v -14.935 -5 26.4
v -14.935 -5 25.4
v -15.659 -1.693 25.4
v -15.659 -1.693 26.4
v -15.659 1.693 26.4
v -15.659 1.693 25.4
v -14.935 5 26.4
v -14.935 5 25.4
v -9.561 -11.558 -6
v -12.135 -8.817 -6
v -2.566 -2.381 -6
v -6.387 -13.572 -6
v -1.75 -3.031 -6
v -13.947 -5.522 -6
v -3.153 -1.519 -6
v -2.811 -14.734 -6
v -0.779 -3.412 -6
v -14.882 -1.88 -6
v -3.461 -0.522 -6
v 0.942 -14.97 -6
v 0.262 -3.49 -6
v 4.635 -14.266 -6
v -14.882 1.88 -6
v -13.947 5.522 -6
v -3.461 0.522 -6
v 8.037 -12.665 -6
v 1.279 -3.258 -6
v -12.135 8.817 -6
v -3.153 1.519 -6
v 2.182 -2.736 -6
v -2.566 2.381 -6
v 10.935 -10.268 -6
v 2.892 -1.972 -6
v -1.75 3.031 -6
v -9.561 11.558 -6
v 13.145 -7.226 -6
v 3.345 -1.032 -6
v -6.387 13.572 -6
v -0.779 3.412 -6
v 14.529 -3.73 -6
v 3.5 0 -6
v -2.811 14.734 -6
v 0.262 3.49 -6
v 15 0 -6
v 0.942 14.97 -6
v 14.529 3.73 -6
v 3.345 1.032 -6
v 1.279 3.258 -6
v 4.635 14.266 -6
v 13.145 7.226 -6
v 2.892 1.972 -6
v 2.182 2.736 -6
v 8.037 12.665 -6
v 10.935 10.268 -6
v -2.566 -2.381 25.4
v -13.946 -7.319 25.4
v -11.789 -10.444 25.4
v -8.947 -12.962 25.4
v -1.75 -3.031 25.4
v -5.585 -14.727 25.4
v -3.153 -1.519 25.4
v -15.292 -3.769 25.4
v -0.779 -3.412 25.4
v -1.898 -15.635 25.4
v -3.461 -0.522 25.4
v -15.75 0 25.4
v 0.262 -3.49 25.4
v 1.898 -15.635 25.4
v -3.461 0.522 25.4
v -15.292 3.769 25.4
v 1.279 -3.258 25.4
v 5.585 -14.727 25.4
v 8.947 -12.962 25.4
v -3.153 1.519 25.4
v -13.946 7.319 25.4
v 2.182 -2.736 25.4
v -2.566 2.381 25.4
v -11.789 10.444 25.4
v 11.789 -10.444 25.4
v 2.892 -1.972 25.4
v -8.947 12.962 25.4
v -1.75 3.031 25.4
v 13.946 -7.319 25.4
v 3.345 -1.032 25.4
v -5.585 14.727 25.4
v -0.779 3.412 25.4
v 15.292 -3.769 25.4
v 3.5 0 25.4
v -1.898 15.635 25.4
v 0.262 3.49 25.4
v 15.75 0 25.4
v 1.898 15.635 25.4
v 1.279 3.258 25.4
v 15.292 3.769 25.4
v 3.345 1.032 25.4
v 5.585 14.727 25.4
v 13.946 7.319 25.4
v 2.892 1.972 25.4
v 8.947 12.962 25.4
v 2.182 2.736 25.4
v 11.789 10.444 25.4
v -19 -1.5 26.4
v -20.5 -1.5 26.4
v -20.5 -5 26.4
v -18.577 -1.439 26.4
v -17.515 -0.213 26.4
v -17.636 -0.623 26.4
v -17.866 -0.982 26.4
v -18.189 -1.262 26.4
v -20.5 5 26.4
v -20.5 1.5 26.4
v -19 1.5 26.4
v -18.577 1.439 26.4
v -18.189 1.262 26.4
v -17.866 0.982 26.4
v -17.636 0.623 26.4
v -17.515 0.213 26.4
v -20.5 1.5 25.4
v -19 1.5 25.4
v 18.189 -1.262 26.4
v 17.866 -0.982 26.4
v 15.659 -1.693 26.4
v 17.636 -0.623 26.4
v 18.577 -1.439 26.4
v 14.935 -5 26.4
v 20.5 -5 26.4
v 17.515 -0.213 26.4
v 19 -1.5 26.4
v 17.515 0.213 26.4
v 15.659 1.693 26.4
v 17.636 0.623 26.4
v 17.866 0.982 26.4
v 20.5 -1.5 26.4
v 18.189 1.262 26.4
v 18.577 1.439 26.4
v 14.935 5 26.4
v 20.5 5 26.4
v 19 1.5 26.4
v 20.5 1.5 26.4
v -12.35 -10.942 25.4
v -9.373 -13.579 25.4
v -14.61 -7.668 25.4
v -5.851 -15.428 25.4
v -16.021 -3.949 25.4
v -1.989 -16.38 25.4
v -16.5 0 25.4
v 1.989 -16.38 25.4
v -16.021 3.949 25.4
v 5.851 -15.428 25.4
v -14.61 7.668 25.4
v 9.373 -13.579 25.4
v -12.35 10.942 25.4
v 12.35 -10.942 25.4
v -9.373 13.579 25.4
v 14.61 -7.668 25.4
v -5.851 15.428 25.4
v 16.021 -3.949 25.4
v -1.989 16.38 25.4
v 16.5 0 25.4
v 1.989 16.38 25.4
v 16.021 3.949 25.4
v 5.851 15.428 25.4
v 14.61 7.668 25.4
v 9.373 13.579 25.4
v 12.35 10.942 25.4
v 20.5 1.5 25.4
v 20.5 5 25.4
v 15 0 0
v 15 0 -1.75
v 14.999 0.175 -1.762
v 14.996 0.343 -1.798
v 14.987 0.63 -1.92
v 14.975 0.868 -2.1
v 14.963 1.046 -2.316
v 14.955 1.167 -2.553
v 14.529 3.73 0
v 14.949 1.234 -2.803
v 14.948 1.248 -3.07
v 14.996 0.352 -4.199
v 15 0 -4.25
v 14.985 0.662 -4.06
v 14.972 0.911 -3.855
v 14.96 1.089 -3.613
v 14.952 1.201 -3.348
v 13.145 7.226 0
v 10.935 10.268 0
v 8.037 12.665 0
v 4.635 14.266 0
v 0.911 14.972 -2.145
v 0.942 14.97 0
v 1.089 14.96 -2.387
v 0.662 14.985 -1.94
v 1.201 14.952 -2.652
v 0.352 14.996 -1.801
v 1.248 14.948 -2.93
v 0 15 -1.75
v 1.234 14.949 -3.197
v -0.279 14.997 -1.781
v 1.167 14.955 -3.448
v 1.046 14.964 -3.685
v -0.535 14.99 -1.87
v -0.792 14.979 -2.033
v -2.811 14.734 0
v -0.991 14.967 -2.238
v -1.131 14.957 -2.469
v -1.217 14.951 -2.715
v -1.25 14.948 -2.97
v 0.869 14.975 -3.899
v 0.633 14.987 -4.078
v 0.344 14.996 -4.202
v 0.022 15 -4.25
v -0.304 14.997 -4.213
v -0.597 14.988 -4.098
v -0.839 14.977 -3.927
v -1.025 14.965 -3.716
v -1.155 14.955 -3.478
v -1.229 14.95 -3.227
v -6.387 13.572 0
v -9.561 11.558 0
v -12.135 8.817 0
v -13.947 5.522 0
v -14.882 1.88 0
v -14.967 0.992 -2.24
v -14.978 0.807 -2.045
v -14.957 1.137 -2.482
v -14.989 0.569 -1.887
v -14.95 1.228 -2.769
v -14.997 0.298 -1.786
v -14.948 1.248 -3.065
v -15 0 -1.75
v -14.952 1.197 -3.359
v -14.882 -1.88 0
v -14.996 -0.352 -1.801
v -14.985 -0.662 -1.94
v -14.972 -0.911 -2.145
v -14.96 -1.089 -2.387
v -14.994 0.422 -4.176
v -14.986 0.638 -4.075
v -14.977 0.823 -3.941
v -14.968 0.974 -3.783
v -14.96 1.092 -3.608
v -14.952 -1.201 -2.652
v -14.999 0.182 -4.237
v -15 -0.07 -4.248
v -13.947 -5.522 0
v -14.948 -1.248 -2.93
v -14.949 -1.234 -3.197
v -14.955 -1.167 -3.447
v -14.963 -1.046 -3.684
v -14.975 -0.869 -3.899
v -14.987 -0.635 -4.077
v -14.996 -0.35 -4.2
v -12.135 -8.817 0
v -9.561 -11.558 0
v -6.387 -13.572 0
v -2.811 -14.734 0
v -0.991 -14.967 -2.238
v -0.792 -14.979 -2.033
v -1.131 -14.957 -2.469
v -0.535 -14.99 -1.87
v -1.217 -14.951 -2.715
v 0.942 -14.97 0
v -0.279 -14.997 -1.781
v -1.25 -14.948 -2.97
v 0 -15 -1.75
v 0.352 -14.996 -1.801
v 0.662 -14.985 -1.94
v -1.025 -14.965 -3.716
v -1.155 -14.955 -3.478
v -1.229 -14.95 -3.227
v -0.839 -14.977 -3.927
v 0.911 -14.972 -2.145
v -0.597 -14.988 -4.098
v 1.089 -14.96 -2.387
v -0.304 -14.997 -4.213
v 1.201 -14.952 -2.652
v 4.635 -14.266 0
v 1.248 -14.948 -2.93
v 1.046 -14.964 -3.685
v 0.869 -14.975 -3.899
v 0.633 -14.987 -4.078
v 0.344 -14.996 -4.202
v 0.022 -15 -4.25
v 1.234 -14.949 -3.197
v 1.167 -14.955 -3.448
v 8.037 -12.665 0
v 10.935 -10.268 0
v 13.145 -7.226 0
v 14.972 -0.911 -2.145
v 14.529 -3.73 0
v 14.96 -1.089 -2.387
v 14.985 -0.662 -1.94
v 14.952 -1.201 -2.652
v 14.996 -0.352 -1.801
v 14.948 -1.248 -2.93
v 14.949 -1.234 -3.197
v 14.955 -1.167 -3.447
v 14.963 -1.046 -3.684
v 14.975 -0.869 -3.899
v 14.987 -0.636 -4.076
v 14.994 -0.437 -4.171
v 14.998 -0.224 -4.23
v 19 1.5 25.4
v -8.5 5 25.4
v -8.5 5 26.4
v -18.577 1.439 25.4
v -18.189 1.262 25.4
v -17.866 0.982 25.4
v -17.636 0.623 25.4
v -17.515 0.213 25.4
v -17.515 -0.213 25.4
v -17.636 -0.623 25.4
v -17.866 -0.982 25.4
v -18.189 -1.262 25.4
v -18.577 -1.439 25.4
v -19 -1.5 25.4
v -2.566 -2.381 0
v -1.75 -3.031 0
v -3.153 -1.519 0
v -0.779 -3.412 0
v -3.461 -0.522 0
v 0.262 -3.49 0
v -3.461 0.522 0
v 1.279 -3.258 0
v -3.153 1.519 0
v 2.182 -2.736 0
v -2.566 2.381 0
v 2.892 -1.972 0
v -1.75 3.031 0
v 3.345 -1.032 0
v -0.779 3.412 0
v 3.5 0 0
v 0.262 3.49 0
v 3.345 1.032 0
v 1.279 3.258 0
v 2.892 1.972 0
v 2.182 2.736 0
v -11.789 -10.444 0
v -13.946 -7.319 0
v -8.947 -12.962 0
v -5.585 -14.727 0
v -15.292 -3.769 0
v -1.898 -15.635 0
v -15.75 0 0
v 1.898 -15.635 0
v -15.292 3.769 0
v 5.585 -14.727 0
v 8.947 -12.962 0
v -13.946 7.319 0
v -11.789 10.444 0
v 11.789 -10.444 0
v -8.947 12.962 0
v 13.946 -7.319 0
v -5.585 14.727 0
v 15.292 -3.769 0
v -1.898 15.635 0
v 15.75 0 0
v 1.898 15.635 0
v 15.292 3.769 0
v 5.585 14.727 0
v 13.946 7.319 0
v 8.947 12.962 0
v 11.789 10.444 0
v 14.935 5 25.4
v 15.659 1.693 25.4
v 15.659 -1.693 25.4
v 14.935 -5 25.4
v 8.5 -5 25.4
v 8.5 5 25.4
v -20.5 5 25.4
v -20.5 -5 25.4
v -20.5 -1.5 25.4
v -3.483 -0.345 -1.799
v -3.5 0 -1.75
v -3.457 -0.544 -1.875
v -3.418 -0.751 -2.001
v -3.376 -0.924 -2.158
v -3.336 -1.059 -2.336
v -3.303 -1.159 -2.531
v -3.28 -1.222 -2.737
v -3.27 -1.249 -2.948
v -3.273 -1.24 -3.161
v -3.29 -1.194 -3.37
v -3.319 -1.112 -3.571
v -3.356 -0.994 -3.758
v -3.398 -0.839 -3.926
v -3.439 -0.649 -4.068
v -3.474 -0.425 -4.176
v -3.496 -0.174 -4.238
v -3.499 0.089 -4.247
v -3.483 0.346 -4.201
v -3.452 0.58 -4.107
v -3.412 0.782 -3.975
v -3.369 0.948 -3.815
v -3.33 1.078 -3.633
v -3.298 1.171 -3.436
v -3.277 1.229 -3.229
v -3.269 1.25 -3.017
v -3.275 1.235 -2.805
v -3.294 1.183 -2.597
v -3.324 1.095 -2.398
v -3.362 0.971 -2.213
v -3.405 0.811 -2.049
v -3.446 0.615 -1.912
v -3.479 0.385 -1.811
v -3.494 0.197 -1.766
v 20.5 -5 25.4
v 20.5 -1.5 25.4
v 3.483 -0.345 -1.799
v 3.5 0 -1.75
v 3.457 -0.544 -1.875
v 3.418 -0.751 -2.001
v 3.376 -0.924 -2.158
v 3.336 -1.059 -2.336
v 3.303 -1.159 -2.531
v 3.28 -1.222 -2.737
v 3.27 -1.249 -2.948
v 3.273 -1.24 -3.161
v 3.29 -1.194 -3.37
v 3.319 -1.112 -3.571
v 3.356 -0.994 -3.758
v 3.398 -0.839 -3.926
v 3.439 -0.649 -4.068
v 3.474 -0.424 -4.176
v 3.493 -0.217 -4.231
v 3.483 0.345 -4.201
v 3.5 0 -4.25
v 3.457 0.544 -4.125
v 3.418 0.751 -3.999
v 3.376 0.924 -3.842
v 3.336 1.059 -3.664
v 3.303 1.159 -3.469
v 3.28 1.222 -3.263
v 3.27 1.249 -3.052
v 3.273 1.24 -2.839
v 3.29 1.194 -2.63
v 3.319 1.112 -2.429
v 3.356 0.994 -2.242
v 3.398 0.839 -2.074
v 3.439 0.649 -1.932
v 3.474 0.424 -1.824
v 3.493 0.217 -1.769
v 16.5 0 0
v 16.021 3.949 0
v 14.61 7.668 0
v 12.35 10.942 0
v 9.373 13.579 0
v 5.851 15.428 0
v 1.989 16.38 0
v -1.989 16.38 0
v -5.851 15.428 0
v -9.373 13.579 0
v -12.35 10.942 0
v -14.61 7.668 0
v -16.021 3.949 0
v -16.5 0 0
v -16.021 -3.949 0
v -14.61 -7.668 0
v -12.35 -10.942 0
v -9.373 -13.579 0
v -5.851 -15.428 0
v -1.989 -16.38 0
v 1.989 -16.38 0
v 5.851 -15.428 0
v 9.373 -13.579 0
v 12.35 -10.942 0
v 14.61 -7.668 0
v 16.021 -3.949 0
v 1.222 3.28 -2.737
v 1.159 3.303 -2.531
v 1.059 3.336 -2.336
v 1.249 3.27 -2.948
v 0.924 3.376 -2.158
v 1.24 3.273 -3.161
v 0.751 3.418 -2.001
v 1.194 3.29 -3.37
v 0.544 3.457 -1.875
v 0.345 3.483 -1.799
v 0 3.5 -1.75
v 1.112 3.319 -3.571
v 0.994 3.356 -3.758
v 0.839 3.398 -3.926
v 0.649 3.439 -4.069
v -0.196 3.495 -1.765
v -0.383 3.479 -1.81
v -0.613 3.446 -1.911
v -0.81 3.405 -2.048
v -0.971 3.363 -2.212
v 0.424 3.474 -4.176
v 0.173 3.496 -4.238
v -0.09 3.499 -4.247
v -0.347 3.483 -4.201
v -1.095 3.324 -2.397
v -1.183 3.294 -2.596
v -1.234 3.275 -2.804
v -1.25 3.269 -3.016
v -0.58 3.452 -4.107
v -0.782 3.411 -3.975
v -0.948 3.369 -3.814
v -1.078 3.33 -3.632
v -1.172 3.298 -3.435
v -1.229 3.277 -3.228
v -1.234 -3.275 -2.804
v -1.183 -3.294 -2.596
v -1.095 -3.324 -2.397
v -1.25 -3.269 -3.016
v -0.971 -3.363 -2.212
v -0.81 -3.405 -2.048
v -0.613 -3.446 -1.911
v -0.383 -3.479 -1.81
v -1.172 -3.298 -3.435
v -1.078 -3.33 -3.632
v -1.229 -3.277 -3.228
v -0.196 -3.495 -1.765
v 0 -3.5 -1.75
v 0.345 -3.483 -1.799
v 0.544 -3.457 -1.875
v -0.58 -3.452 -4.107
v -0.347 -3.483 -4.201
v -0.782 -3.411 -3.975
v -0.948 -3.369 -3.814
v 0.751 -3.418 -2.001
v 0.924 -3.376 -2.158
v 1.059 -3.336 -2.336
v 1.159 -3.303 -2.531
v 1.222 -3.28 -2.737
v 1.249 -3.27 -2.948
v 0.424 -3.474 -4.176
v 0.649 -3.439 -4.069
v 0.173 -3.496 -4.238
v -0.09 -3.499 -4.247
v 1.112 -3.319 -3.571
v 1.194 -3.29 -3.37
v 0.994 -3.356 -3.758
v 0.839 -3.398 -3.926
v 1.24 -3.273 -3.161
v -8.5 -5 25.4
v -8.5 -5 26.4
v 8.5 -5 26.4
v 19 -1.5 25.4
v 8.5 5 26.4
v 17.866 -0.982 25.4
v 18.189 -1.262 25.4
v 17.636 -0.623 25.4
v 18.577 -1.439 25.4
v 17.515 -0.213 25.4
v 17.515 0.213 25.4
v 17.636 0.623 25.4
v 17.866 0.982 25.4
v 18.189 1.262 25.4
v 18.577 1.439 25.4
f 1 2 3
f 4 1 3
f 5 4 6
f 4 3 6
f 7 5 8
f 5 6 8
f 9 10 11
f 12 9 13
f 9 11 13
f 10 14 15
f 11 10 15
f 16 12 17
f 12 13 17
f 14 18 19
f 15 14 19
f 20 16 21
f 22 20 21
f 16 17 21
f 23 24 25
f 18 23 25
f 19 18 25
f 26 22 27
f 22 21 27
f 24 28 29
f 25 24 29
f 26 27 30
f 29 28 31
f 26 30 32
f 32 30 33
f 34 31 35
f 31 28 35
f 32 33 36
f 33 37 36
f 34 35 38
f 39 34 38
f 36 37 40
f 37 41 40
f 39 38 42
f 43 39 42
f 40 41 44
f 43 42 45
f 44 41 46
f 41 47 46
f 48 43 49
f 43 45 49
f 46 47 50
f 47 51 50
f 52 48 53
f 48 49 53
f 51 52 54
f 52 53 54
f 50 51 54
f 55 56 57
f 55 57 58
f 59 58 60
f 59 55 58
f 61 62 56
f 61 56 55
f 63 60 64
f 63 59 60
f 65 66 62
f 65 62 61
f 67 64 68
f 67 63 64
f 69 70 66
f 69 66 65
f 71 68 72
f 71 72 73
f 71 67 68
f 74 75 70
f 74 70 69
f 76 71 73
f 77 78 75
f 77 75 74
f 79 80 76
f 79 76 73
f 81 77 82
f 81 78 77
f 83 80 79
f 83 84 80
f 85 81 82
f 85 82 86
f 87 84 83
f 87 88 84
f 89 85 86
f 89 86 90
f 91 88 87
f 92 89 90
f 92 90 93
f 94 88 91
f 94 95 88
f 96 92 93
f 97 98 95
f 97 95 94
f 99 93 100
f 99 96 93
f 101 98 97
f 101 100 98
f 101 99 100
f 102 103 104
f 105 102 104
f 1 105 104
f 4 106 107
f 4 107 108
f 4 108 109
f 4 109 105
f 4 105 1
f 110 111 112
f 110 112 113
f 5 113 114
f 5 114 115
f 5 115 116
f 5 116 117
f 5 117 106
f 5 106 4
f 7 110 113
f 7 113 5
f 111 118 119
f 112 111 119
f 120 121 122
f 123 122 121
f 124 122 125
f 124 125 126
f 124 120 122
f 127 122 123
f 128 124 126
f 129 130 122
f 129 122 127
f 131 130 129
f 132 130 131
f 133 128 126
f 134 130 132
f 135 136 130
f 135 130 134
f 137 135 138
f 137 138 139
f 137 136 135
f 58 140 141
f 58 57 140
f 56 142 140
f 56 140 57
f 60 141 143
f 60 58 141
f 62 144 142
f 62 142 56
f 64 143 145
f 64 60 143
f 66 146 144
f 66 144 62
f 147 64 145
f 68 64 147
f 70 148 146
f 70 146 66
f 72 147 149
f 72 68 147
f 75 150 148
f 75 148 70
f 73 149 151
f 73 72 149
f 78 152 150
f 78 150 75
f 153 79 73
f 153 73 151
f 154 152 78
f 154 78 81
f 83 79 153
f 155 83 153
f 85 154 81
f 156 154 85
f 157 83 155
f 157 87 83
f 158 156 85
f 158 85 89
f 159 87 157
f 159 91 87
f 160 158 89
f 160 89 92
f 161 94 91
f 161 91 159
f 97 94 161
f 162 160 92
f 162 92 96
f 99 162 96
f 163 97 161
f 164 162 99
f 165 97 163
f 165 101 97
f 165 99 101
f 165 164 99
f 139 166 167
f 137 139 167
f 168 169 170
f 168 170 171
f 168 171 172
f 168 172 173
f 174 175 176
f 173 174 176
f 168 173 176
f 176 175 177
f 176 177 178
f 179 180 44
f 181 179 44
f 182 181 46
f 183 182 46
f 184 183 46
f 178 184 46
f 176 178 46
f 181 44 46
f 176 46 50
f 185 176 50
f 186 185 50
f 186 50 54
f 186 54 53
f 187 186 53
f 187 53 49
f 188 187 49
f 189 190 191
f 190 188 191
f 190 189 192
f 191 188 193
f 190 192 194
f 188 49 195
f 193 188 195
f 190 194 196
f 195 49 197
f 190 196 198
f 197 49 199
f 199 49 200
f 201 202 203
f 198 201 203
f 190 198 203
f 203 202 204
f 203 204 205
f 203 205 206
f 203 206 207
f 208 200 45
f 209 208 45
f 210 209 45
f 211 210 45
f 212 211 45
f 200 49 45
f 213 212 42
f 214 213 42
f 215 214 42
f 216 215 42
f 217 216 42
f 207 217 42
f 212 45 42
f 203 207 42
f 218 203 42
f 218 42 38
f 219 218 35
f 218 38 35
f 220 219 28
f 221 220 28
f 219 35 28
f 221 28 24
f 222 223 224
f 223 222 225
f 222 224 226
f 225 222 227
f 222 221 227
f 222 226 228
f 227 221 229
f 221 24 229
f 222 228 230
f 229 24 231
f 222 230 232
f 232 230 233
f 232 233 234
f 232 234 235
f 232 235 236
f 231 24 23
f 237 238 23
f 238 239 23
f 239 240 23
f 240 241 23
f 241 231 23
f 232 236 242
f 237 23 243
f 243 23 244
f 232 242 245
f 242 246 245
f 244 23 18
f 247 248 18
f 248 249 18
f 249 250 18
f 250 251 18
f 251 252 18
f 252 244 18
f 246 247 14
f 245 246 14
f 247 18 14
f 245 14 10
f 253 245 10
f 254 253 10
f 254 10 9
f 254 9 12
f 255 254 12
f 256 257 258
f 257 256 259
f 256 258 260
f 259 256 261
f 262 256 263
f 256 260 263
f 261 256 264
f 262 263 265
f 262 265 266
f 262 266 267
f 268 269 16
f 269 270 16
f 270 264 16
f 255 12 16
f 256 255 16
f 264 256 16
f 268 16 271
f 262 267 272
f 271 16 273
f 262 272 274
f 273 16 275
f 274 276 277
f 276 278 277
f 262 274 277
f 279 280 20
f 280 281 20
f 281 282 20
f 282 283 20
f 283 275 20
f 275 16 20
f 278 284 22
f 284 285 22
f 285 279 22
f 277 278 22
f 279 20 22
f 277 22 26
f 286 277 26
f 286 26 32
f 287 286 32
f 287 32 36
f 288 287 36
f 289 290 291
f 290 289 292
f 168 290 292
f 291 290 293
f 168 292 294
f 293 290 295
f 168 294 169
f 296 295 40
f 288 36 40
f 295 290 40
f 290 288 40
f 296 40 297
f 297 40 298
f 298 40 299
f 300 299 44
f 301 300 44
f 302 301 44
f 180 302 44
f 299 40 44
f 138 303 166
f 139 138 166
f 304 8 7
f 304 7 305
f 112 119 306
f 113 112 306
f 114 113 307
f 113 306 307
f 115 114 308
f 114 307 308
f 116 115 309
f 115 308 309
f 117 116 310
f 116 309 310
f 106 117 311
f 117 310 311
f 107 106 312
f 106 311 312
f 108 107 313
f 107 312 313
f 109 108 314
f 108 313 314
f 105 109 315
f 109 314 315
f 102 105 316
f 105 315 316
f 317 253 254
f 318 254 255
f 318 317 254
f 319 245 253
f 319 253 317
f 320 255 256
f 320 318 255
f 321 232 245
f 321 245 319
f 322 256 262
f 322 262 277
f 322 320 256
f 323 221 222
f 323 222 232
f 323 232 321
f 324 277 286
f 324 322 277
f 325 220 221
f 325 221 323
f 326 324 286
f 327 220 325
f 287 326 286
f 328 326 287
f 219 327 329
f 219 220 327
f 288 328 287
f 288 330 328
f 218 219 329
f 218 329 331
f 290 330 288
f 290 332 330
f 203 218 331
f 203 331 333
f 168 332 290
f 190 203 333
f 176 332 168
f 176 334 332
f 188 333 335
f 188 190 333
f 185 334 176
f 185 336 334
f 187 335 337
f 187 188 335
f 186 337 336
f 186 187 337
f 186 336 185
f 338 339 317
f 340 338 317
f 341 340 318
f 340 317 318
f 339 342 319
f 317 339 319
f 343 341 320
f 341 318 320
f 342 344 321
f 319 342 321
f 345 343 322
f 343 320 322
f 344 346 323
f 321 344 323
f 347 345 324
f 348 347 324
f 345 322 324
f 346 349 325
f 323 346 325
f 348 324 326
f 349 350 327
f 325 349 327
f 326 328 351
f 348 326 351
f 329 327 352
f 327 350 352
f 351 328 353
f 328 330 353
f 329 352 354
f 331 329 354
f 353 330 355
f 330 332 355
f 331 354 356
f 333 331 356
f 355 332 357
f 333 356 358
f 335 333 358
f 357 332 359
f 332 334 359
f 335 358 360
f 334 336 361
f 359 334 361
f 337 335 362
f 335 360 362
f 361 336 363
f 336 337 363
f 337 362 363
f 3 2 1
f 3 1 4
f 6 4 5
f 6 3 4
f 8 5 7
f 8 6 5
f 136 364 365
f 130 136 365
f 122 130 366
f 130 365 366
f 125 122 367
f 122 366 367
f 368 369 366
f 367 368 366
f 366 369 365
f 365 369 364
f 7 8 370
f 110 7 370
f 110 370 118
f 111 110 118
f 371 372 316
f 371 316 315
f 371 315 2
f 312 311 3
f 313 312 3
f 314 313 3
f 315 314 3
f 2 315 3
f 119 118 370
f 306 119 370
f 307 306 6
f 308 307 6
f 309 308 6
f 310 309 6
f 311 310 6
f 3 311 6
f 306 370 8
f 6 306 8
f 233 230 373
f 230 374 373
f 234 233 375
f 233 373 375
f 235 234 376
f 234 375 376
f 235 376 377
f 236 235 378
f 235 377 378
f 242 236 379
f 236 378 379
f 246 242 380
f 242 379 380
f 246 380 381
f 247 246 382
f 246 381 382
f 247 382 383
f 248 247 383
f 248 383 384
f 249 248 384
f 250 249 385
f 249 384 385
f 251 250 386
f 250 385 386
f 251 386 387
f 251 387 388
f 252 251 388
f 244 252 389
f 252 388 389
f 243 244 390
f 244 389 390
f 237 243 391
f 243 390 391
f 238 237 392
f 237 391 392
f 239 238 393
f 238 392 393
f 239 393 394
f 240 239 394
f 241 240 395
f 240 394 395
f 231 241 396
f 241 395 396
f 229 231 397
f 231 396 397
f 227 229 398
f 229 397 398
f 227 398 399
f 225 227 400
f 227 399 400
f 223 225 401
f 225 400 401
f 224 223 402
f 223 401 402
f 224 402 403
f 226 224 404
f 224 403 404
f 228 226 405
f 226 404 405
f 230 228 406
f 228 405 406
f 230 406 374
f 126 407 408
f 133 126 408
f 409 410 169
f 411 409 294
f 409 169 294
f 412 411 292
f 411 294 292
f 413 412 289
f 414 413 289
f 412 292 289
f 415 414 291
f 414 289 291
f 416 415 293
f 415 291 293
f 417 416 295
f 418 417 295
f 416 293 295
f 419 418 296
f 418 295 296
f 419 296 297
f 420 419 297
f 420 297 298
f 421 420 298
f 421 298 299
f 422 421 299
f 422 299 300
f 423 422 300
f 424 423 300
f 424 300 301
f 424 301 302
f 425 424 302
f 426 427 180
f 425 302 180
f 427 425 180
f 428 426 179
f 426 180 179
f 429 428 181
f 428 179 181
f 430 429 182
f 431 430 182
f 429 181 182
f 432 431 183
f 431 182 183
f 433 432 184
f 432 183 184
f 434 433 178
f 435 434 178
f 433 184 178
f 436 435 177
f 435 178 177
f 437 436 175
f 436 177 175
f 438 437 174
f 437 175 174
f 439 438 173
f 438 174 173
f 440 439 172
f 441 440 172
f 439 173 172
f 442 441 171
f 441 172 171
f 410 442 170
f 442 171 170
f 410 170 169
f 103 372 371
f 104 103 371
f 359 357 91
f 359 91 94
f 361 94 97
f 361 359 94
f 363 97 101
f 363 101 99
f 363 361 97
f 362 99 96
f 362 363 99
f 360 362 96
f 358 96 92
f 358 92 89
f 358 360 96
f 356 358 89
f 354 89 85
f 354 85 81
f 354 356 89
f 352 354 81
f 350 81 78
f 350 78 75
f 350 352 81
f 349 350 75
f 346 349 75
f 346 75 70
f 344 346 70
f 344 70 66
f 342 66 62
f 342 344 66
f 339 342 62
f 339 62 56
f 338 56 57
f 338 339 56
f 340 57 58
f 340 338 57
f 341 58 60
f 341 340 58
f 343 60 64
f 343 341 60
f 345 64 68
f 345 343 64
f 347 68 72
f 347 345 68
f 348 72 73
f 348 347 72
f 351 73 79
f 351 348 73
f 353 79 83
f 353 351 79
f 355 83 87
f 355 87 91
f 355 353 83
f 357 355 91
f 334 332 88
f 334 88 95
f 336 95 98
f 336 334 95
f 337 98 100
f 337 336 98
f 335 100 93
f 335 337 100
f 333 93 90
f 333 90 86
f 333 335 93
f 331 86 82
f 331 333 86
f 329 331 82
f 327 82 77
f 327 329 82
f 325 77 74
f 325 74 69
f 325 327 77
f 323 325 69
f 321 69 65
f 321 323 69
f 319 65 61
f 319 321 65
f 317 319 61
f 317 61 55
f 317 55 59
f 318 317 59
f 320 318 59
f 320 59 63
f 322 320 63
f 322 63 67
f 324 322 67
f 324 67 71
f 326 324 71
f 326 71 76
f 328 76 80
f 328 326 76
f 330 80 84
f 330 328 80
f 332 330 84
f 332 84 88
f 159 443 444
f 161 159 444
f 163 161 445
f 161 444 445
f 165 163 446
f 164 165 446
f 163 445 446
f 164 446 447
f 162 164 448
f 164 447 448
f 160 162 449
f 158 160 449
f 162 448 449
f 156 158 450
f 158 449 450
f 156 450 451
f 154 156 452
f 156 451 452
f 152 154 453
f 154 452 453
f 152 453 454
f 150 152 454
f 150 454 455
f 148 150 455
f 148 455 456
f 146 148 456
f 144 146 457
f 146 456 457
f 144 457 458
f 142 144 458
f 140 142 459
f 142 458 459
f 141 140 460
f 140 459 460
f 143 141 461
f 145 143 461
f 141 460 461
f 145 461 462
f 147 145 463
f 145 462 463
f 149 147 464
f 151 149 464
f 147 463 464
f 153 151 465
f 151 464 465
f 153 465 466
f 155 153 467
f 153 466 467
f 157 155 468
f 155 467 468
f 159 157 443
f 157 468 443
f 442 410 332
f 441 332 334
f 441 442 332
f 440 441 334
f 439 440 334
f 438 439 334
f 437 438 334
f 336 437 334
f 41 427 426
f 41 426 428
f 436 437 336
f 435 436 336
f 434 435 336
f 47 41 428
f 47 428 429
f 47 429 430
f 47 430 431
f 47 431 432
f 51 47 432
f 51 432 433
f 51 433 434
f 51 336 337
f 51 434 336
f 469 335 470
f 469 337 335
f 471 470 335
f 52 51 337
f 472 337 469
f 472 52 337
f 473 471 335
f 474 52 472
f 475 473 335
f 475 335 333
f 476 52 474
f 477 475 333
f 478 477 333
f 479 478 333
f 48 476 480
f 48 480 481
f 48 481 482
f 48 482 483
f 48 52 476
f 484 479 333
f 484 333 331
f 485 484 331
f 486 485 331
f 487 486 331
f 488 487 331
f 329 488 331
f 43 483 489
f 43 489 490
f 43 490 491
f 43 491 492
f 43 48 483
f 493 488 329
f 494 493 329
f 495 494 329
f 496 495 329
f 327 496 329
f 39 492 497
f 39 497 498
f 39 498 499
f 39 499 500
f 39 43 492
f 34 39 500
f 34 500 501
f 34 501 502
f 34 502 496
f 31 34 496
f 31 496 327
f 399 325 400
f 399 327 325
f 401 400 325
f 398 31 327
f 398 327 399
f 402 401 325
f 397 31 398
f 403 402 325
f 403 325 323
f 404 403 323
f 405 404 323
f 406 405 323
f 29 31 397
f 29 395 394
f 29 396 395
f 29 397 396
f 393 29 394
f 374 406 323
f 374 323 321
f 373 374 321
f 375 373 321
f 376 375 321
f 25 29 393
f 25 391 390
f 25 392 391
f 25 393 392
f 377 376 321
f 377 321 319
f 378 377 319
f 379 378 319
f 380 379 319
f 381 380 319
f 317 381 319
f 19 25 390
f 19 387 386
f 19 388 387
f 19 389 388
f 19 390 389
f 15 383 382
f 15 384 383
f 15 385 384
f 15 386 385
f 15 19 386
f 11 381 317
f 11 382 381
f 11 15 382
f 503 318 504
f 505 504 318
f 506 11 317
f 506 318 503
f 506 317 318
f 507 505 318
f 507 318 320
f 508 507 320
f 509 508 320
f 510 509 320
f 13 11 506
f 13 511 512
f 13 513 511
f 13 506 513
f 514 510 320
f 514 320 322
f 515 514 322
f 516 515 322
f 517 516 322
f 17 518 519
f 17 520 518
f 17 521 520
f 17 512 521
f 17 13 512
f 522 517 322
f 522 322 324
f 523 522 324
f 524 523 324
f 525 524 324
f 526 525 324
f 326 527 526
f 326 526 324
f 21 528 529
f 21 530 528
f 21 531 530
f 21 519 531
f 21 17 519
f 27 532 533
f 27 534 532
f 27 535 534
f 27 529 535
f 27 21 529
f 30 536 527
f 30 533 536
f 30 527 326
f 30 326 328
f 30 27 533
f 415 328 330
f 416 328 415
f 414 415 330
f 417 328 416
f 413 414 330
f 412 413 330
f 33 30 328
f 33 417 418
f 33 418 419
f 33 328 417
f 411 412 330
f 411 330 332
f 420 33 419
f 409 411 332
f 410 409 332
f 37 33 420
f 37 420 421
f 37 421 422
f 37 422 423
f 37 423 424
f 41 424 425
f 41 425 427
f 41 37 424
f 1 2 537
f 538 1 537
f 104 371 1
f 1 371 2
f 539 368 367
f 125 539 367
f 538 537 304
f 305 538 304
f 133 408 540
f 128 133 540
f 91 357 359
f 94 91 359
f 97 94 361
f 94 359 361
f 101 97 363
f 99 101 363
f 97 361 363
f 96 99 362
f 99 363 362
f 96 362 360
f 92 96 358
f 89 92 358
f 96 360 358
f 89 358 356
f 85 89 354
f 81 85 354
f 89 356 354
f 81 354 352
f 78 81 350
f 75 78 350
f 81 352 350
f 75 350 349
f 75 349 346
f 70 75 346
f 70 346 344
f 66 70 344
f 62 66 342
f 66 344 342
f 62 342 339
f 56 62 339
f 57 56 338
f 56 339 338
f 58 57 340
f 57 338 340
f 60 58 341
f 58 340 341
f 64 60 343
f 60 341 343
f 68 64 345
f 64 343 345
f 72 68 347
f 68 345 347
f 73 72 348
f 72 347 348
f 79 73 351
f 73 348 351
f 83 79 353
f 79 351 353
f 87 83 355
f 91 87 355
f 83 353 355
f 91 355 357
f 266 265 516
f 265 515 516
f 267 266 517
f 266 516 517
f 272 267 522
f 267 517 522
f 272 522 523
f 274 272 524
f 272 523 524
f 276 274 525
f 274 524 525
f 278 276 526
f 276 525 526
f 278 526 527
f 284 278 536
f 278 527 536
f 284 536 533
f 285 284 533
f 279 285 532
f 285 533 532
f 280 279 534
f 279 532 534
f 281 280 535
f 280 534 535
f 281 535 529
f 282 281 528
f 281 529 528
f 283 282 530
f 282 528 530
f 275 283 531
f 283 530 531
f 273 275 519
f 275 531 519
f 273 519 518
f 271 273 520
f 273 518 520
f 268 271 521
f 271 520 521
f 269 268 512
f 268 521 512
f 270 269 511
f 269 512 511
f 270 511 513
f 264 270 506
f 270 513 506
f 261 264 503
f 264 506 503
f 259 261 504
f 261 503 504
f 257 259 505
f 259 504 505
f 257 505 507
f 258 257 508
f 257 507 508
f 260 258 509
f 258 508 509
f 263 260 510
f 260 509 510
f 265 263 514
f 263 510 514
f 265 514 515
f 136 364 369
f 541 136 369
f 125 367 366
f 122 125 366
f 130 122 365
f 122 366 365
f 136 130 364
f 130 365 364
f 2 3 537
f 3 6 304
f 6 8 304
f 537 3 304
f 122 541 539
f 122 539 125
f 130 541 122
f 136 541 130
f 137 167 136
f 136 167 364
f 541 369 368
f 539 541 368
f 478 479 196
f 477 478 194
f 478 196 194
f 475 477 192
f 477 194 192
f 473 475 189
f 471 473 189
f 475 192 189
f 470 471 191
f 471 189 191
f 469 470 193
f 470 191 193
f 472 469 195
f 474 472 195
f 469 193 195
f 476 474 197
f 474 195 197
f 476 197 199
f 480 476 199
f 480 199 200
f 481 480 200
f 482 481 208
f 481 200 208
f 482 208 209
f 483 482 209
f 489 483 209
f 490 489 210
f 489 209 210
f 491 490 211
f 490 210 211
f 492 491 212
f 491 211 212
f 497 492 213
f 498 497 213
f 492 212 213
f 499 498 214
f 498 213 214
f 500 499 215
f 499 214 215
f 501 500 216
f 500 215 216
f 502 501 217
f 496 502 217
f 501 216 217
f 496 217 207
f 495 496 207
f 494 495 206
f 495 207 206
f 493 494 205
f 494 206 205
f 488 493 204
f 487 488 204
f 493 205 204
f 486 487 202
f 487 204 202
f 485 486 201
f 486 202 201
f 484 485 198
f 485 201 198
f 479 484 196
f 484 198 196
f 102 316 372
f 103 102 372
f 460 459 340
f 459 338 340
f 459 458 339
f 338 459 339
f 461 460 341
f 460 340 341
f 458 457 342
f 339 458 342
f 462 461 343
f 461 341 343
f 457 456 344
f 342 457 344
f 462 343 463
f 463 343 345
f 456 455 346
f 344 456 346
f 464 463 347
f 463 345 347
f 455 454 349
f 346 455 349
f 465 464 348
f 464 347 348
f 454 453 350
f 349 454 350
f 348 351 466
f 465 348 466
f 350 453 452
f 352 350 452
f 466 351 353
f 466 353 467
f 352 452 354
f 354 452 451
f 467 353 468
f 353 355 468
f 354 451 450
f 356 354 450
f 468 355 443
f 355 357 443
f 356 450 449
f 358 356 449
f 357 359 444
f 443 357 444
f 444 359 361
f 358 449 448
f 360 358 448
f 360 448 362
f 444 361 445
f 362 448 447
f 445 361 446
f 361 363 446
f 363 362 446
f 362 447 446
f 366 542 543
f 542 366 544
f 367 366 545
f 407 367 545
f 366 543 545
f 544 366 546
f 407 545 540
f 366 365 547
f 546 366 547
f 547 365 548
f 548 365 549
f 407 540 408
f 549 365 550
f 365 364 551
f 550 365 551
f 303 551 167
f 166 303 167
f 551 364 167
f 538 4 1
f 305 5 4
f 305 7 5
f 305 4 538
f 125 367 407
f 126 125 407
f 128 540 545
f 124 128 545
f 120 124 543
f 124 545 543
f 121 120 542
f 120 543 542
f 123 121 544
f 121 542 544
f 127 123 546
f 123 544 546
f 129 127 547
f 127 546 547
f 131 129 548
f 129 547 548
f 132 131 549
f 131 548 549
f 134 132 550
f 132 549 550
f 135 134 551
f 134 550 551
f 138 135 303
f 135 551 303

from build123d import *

# Parameters (mm, degrees)
SKETCH_1_R                   = 16.5
EXTRUDE_1_DEPTH              = 25.4
CUT_EXTRUDE_1_REACH          = 36.491
SKETCH_2_R                   = 3.5
SKETCH_3_R                   = 15
SKETCH_3_R_2                 = 3.5
EXTRUDE_2_DEPTH              = 6
SKETCH_7_W                   = 12
SKETCH_7_H                   = 10
EXTRUDE_6_DEPTH              = 1
CUT_EXTRUDE_3_DEPTH          = 1
SPLIT_START                  = -6
SPLIT_BODIES_2_OUTLINE_R     = 15
SPLIT_BODIES_2_OUTLINE_R_2   = 3.5
SPLIT_BODIES_2_DEPTH         = 6
SPLIT_BODIES_2_2_OUTLINE_R   = 15.75
SPLIT_BODIES_2_2_OUTLINE_R_2 = 3.5
SPLIT_BODIES_2_2_DEPTH       = 25.4
SPLIT_BODIES_2_3_OUTLINE_R   = 16.5
SPLIT_BODIES_2_3_OUTLINE_R_2 = 3.5
SPLIT_BODIES_2_3_DEPTH       = 31.4
SPLIT_START_2                = 25.4
SPLIT_BODIES_2_4_DEPTH       = 1
SPLIT_BODIES_2_5_DEPTH       = 1
SPLIT_BODIES_2_6_DEPTH       = 1
SPLIT_BODIES_2_7_DEPTH       = 1
SPLIT_BODIES_2_8_OUTLINE_R   = 16.5
SPLIT_BODIES_2_8_OUTLINE_R_2 = 15.75
SPLIT_BODIES_2_8_DEPTH       = 25.4
SKETCH_11_R                  = 1.25
CUT_EXTRUDE_4_DEPTH          = 38.275461097
PATTERN_CIRCULAR_1_COUNT     = 2
PATTERN_CIRCULAR_1_ANGLE     = 90


# Read off the part's stored shape, not the designer's step: 分割2
with BuildPart() as part:
    # 草圖1 → 填料-伸長1 (new body)
    with BuildSketch(Plane.XY):
        Circle(SKETCH_1_R)
    extrude(amount=EXTRUDE_1_DEPTH)

    # 草圖2 → 除料-伸長1 (cut, up to next)
    with BuildSketch(Plane.XY.offset(25.4), mode=Mode.PRIVATE) as cut_extrude_1_sk1:
        Circle(SKETCH_2_R)
    cut_extrude_1_tool1 = extrude(cut_extrude_1_sk1.sketch, amount=-CUT_EXTRUDE_1_REACH, mode=Mode.PRIVATE) & part.part
    add(cut_extrude_1_tool1.solids().sort_by_distance((0, 0, 25.4))[0], mode=Mode.SUBTRACT)

    # 草圖3 → 填料-伸長2 (add)
    with BuildSketch(Plane(origin=(0, 0, 0), x_dir=(-1, 0, 0), z_dir=(0, 0, -1))):
        Circle(SKETCH_3_R)
        with Locations(Location((0, 0, 0), (0, 0, 180))):
            Circle(SKETCH_3_R_2, mode=Mode.SUBTRACT)
    extrude(amount=EXTRUDE_2_DEPTH)

    # 草圖7 → 填料-伸長6 (add)
    with BuildSketch(Plane.XY.offset(25.4)):
        with Locations((-14.5, 0)):
            Rectangle(SKETCH_7_W, SKETCH_7_H)
    extrude_6 = extrude(amount=EXTRUDE_6_DEPTH)

    # 草圖8 → 除料-伸長3 (cut)
    with BuildSketch(Plane.XY.offset(26.4)):
        with BuildLine():
            Line((-19, 1.5), (-20.5, 1.5))
            Line((-20.5, 1.5), (-20.5, -1.5))
            Line((-20.5, -1.5), (-19, -1.5))
            ThreePointArc((-19, -1.5), (-17.5, 0), (-19, 1.5))
        make_face()
    cut_extrude_3 = extrude(amount=-CUT_EXTRUDE_3_DEPTH, mode=Mode.SUBTRACT)

    # 鏡射2: 填料-伸長6, 除料-伸長3 across plane
    add(extrude_6.mirror(Plane(origin=(0, 0, 0), x_dir=(0, 0, 1), z_dir=(1, 0, 0))))
    add(cut_extrude_3.mirror(Plane(origin=(0, 0, 0), x_dir=(0, 0, 1), z_dir=(1, 0, 0))), mode=Mode.SUBTRACT)

    # Split Bodies 2 3 outline → Split Bodies 2 3 (cut)
    with BuildSketch(Plane.XY.offset(SPLIT_START)):
        Circle(SPLIT_BODIES_2_3_OUTLINE_R)
        Circle(SPLIT_BODIES_2_3_OUTLINE_R_2, mode=Mode.SUBTRACT)
    extrude(amount=SPLIT_BODIES_2_3_DEPTH, mode=Mode.SUBTRACT)

    # Split Bodies 2 4 outline → Split Bodies 2 4 (cut)
    with BuildSketch(Plane.XY.offset(SPLIT_START_2)):
        with BuildLine():
            ThreePointArc((-14.935277031, -5), (-15.75, 0), (-14.935277031, 5))
            Line((-14.935277031, 5), (-20.5, 5))
            Line((-20.5, 5), (-20.5, 1.5))
            Line((-20.5, 1.5), (-19, 1.5))
            ThreePointArc((-19, 1.5), (-17.5, 0), (-19, -1.5))
            Line((-19, -1.5), (-20.5, -1.5))
            Line((-20.5, -1.5), (-20.5, -5))
            Line((-20.5, -5), (-14.935277031, -5))
        make_face()
        with BuildLine():
            Line((8.5, -5), (20.5, -5))
            Line((20.5, -5), (20.5, -1.5))
            Line((20.5, -1.5), (19, -1.5))
            ThreePointArc((19, -1.5), (17.5, 0), (19, 1.5))
            Line((19, 1.5), (20.5, 1.5))
            Line((20.5, 1.5), (20.5, 5))
            Line((20.5, 5), (8.5, 5))
            Line((8.5, 5), (8.5, -5))
        make_face()
    extrude(amount=SPLIT_BODIES_2_4_DEPTH, mode=Mode.SUBTRACT)


with BuildPart() as body_2:
    # Split Bodies 2 outline → Split Bodies 2 (new body)
    with BuildSketch(Plane.XY.offset(SPLIT_START)):
        Circle(SPLIT_BODIES_2_OUTLINE_R)
        Circle(SPLIT_BODIES_2_OUTLINE_R_2, mode=Mode.SUBTRACT)
    extrude(amount=SPLIT_BODIES_2_DEPTH)

    # 草圖11 → 除料-伸長4 (cut, symmetric)
    with BuildSketch(Plane(origin=(0, 0, 0), x_dir=(1, 0, 0), z_dir=(0, 1, 0))):
        with Locations(Location((0, 3, 0), (0, 0, 270))):
            Circle(SKETCH_11_R)
    cut_extrude_4 = extrude(amount=CUT_EXTRUDE_4_DEPTH, both=True, mode=Mode.SUBTRACT)

    # 環狀複製排列1: 除料-伸長4 ×2 about axis
    pattern_circular_1_axis = Axis((0, 0, -6), (0, 0, -1))
    for i in range(1, PATTERN_CIRCULAR_1_COUNT):
        add(cut_extrude_4.rotate(pattern_circular_1_axis, i * PATTERN_CIRCULAR_1_ANGLE / (PATTERN_CIRCULAR_1_COUNT - 1)), mode=Mode.SUBTRACT)


with BuildPart() as body_3:
    # Split Bodies 2 2 outline → Split Bodies 2 2 (new body)
    with BuildSketch(Plane.XY):
        Circle(SPLIT_BODIES_2_2_OUTLINE_R)
        Circle(SPLIT_BODIES_2_2_OUTLINE_R_2, mode=Mode.SUBTRACT)
    extrude(amount=SPLIT_BODIES_2_2_DEPTH)


with BuildPart() as body_4:
    # Split Bodies 2 5 outline → Split Bodies 2 5 (new body)
    with BuildSketch(Plane.XY.offset(SPLIT_START_2)):
        with BuildLine():
            Line((-20.5, -5), (-14.935277031, -5))
            ThreePointArc((-14.935277031, -5), (-15.75, 0), (-14.935277031, 5))
            Line((-14.935277031, 5), (-20.5, 5))
            Line((-20.5, 5), (-20.5, 1.5))
            Line((-20.5, 1.5), (-19, 1.5))
            ThreePointArc((-19, 1.5), (-17.5, 0), (-19, -1.5))
            Line((-19, -1.5), (-20.5, -1.5))
            Line((-20.5, -1.5), (-20.5, -5))
        make_face()
    extrude(amount=SPLIT_BODIES_2_5_DEPTH)


with BuildPart() as body_5:
    # Split Bodies 2 6 outline → Split Bodies 2 6 (new body)
    with BuildSketch(Plane.XY.offset(SPLIT_START_2)):
        with BuildLine():
            Line((20.5, 5), (14.935277031, 5))
            ThreePointArc((14.935277031, 5), (15.75, 0), (14.935277031, -5))
            Line((14.935277031, -5), (20.5, -5))
            Line((20.5, -5), (20.5, -1.5))
            Line((20.5, -1.5), (19, -1.5))
            ThreePointArc((19, -1.5), (17.5, 0), (19, 1.5))
            Line((19, 1.5), (20.5, 1.5))
            Line((20.5, 1.5), (20.5, 5))
        make_face()
    extrude(amount=SPLIT_BODIES_2_6_DEPTH)


with BuildPart() as body_6:
    # Split Bodies 2 7 outline → Split Bodies 2 7 (new body)
    with BuildSketch(Plane.XY.offset(SPLIT_START_2)):
        with BuildLine():
            ThreePointArc((14.935277031, -5), (15.75, 0), (14.935277031, 5))
            Line((14.935277031, 5), (8.5, 5))
            Line((8.5, 5), (8.5, -5))
            Line((8.5, -5), (14.935277031, -5))
        make_face()
    extrude(amount=SPLIT_BODIES_2_7_DEPTH)


with BuildPart() as body_7:
    # Split Bodies 2 8 outline → Split Bodies 2 8 (new body)
    with BuildSketch(Plane.XY):
        Circle(SPLIT_BODIES_2_8_OUTLINE_R)
        Circle(SPLIT_BODIES_2_8_OUTLINE_R_2, mode=Mode.SUBTRACT)
    extrude(amount=SPLIT_BODIES_2_8_DEPTH)


solid = Compound([part.part, body_2.part, body_3.part, body_4.part, body_5.part, body_6.part, body_7.part])
